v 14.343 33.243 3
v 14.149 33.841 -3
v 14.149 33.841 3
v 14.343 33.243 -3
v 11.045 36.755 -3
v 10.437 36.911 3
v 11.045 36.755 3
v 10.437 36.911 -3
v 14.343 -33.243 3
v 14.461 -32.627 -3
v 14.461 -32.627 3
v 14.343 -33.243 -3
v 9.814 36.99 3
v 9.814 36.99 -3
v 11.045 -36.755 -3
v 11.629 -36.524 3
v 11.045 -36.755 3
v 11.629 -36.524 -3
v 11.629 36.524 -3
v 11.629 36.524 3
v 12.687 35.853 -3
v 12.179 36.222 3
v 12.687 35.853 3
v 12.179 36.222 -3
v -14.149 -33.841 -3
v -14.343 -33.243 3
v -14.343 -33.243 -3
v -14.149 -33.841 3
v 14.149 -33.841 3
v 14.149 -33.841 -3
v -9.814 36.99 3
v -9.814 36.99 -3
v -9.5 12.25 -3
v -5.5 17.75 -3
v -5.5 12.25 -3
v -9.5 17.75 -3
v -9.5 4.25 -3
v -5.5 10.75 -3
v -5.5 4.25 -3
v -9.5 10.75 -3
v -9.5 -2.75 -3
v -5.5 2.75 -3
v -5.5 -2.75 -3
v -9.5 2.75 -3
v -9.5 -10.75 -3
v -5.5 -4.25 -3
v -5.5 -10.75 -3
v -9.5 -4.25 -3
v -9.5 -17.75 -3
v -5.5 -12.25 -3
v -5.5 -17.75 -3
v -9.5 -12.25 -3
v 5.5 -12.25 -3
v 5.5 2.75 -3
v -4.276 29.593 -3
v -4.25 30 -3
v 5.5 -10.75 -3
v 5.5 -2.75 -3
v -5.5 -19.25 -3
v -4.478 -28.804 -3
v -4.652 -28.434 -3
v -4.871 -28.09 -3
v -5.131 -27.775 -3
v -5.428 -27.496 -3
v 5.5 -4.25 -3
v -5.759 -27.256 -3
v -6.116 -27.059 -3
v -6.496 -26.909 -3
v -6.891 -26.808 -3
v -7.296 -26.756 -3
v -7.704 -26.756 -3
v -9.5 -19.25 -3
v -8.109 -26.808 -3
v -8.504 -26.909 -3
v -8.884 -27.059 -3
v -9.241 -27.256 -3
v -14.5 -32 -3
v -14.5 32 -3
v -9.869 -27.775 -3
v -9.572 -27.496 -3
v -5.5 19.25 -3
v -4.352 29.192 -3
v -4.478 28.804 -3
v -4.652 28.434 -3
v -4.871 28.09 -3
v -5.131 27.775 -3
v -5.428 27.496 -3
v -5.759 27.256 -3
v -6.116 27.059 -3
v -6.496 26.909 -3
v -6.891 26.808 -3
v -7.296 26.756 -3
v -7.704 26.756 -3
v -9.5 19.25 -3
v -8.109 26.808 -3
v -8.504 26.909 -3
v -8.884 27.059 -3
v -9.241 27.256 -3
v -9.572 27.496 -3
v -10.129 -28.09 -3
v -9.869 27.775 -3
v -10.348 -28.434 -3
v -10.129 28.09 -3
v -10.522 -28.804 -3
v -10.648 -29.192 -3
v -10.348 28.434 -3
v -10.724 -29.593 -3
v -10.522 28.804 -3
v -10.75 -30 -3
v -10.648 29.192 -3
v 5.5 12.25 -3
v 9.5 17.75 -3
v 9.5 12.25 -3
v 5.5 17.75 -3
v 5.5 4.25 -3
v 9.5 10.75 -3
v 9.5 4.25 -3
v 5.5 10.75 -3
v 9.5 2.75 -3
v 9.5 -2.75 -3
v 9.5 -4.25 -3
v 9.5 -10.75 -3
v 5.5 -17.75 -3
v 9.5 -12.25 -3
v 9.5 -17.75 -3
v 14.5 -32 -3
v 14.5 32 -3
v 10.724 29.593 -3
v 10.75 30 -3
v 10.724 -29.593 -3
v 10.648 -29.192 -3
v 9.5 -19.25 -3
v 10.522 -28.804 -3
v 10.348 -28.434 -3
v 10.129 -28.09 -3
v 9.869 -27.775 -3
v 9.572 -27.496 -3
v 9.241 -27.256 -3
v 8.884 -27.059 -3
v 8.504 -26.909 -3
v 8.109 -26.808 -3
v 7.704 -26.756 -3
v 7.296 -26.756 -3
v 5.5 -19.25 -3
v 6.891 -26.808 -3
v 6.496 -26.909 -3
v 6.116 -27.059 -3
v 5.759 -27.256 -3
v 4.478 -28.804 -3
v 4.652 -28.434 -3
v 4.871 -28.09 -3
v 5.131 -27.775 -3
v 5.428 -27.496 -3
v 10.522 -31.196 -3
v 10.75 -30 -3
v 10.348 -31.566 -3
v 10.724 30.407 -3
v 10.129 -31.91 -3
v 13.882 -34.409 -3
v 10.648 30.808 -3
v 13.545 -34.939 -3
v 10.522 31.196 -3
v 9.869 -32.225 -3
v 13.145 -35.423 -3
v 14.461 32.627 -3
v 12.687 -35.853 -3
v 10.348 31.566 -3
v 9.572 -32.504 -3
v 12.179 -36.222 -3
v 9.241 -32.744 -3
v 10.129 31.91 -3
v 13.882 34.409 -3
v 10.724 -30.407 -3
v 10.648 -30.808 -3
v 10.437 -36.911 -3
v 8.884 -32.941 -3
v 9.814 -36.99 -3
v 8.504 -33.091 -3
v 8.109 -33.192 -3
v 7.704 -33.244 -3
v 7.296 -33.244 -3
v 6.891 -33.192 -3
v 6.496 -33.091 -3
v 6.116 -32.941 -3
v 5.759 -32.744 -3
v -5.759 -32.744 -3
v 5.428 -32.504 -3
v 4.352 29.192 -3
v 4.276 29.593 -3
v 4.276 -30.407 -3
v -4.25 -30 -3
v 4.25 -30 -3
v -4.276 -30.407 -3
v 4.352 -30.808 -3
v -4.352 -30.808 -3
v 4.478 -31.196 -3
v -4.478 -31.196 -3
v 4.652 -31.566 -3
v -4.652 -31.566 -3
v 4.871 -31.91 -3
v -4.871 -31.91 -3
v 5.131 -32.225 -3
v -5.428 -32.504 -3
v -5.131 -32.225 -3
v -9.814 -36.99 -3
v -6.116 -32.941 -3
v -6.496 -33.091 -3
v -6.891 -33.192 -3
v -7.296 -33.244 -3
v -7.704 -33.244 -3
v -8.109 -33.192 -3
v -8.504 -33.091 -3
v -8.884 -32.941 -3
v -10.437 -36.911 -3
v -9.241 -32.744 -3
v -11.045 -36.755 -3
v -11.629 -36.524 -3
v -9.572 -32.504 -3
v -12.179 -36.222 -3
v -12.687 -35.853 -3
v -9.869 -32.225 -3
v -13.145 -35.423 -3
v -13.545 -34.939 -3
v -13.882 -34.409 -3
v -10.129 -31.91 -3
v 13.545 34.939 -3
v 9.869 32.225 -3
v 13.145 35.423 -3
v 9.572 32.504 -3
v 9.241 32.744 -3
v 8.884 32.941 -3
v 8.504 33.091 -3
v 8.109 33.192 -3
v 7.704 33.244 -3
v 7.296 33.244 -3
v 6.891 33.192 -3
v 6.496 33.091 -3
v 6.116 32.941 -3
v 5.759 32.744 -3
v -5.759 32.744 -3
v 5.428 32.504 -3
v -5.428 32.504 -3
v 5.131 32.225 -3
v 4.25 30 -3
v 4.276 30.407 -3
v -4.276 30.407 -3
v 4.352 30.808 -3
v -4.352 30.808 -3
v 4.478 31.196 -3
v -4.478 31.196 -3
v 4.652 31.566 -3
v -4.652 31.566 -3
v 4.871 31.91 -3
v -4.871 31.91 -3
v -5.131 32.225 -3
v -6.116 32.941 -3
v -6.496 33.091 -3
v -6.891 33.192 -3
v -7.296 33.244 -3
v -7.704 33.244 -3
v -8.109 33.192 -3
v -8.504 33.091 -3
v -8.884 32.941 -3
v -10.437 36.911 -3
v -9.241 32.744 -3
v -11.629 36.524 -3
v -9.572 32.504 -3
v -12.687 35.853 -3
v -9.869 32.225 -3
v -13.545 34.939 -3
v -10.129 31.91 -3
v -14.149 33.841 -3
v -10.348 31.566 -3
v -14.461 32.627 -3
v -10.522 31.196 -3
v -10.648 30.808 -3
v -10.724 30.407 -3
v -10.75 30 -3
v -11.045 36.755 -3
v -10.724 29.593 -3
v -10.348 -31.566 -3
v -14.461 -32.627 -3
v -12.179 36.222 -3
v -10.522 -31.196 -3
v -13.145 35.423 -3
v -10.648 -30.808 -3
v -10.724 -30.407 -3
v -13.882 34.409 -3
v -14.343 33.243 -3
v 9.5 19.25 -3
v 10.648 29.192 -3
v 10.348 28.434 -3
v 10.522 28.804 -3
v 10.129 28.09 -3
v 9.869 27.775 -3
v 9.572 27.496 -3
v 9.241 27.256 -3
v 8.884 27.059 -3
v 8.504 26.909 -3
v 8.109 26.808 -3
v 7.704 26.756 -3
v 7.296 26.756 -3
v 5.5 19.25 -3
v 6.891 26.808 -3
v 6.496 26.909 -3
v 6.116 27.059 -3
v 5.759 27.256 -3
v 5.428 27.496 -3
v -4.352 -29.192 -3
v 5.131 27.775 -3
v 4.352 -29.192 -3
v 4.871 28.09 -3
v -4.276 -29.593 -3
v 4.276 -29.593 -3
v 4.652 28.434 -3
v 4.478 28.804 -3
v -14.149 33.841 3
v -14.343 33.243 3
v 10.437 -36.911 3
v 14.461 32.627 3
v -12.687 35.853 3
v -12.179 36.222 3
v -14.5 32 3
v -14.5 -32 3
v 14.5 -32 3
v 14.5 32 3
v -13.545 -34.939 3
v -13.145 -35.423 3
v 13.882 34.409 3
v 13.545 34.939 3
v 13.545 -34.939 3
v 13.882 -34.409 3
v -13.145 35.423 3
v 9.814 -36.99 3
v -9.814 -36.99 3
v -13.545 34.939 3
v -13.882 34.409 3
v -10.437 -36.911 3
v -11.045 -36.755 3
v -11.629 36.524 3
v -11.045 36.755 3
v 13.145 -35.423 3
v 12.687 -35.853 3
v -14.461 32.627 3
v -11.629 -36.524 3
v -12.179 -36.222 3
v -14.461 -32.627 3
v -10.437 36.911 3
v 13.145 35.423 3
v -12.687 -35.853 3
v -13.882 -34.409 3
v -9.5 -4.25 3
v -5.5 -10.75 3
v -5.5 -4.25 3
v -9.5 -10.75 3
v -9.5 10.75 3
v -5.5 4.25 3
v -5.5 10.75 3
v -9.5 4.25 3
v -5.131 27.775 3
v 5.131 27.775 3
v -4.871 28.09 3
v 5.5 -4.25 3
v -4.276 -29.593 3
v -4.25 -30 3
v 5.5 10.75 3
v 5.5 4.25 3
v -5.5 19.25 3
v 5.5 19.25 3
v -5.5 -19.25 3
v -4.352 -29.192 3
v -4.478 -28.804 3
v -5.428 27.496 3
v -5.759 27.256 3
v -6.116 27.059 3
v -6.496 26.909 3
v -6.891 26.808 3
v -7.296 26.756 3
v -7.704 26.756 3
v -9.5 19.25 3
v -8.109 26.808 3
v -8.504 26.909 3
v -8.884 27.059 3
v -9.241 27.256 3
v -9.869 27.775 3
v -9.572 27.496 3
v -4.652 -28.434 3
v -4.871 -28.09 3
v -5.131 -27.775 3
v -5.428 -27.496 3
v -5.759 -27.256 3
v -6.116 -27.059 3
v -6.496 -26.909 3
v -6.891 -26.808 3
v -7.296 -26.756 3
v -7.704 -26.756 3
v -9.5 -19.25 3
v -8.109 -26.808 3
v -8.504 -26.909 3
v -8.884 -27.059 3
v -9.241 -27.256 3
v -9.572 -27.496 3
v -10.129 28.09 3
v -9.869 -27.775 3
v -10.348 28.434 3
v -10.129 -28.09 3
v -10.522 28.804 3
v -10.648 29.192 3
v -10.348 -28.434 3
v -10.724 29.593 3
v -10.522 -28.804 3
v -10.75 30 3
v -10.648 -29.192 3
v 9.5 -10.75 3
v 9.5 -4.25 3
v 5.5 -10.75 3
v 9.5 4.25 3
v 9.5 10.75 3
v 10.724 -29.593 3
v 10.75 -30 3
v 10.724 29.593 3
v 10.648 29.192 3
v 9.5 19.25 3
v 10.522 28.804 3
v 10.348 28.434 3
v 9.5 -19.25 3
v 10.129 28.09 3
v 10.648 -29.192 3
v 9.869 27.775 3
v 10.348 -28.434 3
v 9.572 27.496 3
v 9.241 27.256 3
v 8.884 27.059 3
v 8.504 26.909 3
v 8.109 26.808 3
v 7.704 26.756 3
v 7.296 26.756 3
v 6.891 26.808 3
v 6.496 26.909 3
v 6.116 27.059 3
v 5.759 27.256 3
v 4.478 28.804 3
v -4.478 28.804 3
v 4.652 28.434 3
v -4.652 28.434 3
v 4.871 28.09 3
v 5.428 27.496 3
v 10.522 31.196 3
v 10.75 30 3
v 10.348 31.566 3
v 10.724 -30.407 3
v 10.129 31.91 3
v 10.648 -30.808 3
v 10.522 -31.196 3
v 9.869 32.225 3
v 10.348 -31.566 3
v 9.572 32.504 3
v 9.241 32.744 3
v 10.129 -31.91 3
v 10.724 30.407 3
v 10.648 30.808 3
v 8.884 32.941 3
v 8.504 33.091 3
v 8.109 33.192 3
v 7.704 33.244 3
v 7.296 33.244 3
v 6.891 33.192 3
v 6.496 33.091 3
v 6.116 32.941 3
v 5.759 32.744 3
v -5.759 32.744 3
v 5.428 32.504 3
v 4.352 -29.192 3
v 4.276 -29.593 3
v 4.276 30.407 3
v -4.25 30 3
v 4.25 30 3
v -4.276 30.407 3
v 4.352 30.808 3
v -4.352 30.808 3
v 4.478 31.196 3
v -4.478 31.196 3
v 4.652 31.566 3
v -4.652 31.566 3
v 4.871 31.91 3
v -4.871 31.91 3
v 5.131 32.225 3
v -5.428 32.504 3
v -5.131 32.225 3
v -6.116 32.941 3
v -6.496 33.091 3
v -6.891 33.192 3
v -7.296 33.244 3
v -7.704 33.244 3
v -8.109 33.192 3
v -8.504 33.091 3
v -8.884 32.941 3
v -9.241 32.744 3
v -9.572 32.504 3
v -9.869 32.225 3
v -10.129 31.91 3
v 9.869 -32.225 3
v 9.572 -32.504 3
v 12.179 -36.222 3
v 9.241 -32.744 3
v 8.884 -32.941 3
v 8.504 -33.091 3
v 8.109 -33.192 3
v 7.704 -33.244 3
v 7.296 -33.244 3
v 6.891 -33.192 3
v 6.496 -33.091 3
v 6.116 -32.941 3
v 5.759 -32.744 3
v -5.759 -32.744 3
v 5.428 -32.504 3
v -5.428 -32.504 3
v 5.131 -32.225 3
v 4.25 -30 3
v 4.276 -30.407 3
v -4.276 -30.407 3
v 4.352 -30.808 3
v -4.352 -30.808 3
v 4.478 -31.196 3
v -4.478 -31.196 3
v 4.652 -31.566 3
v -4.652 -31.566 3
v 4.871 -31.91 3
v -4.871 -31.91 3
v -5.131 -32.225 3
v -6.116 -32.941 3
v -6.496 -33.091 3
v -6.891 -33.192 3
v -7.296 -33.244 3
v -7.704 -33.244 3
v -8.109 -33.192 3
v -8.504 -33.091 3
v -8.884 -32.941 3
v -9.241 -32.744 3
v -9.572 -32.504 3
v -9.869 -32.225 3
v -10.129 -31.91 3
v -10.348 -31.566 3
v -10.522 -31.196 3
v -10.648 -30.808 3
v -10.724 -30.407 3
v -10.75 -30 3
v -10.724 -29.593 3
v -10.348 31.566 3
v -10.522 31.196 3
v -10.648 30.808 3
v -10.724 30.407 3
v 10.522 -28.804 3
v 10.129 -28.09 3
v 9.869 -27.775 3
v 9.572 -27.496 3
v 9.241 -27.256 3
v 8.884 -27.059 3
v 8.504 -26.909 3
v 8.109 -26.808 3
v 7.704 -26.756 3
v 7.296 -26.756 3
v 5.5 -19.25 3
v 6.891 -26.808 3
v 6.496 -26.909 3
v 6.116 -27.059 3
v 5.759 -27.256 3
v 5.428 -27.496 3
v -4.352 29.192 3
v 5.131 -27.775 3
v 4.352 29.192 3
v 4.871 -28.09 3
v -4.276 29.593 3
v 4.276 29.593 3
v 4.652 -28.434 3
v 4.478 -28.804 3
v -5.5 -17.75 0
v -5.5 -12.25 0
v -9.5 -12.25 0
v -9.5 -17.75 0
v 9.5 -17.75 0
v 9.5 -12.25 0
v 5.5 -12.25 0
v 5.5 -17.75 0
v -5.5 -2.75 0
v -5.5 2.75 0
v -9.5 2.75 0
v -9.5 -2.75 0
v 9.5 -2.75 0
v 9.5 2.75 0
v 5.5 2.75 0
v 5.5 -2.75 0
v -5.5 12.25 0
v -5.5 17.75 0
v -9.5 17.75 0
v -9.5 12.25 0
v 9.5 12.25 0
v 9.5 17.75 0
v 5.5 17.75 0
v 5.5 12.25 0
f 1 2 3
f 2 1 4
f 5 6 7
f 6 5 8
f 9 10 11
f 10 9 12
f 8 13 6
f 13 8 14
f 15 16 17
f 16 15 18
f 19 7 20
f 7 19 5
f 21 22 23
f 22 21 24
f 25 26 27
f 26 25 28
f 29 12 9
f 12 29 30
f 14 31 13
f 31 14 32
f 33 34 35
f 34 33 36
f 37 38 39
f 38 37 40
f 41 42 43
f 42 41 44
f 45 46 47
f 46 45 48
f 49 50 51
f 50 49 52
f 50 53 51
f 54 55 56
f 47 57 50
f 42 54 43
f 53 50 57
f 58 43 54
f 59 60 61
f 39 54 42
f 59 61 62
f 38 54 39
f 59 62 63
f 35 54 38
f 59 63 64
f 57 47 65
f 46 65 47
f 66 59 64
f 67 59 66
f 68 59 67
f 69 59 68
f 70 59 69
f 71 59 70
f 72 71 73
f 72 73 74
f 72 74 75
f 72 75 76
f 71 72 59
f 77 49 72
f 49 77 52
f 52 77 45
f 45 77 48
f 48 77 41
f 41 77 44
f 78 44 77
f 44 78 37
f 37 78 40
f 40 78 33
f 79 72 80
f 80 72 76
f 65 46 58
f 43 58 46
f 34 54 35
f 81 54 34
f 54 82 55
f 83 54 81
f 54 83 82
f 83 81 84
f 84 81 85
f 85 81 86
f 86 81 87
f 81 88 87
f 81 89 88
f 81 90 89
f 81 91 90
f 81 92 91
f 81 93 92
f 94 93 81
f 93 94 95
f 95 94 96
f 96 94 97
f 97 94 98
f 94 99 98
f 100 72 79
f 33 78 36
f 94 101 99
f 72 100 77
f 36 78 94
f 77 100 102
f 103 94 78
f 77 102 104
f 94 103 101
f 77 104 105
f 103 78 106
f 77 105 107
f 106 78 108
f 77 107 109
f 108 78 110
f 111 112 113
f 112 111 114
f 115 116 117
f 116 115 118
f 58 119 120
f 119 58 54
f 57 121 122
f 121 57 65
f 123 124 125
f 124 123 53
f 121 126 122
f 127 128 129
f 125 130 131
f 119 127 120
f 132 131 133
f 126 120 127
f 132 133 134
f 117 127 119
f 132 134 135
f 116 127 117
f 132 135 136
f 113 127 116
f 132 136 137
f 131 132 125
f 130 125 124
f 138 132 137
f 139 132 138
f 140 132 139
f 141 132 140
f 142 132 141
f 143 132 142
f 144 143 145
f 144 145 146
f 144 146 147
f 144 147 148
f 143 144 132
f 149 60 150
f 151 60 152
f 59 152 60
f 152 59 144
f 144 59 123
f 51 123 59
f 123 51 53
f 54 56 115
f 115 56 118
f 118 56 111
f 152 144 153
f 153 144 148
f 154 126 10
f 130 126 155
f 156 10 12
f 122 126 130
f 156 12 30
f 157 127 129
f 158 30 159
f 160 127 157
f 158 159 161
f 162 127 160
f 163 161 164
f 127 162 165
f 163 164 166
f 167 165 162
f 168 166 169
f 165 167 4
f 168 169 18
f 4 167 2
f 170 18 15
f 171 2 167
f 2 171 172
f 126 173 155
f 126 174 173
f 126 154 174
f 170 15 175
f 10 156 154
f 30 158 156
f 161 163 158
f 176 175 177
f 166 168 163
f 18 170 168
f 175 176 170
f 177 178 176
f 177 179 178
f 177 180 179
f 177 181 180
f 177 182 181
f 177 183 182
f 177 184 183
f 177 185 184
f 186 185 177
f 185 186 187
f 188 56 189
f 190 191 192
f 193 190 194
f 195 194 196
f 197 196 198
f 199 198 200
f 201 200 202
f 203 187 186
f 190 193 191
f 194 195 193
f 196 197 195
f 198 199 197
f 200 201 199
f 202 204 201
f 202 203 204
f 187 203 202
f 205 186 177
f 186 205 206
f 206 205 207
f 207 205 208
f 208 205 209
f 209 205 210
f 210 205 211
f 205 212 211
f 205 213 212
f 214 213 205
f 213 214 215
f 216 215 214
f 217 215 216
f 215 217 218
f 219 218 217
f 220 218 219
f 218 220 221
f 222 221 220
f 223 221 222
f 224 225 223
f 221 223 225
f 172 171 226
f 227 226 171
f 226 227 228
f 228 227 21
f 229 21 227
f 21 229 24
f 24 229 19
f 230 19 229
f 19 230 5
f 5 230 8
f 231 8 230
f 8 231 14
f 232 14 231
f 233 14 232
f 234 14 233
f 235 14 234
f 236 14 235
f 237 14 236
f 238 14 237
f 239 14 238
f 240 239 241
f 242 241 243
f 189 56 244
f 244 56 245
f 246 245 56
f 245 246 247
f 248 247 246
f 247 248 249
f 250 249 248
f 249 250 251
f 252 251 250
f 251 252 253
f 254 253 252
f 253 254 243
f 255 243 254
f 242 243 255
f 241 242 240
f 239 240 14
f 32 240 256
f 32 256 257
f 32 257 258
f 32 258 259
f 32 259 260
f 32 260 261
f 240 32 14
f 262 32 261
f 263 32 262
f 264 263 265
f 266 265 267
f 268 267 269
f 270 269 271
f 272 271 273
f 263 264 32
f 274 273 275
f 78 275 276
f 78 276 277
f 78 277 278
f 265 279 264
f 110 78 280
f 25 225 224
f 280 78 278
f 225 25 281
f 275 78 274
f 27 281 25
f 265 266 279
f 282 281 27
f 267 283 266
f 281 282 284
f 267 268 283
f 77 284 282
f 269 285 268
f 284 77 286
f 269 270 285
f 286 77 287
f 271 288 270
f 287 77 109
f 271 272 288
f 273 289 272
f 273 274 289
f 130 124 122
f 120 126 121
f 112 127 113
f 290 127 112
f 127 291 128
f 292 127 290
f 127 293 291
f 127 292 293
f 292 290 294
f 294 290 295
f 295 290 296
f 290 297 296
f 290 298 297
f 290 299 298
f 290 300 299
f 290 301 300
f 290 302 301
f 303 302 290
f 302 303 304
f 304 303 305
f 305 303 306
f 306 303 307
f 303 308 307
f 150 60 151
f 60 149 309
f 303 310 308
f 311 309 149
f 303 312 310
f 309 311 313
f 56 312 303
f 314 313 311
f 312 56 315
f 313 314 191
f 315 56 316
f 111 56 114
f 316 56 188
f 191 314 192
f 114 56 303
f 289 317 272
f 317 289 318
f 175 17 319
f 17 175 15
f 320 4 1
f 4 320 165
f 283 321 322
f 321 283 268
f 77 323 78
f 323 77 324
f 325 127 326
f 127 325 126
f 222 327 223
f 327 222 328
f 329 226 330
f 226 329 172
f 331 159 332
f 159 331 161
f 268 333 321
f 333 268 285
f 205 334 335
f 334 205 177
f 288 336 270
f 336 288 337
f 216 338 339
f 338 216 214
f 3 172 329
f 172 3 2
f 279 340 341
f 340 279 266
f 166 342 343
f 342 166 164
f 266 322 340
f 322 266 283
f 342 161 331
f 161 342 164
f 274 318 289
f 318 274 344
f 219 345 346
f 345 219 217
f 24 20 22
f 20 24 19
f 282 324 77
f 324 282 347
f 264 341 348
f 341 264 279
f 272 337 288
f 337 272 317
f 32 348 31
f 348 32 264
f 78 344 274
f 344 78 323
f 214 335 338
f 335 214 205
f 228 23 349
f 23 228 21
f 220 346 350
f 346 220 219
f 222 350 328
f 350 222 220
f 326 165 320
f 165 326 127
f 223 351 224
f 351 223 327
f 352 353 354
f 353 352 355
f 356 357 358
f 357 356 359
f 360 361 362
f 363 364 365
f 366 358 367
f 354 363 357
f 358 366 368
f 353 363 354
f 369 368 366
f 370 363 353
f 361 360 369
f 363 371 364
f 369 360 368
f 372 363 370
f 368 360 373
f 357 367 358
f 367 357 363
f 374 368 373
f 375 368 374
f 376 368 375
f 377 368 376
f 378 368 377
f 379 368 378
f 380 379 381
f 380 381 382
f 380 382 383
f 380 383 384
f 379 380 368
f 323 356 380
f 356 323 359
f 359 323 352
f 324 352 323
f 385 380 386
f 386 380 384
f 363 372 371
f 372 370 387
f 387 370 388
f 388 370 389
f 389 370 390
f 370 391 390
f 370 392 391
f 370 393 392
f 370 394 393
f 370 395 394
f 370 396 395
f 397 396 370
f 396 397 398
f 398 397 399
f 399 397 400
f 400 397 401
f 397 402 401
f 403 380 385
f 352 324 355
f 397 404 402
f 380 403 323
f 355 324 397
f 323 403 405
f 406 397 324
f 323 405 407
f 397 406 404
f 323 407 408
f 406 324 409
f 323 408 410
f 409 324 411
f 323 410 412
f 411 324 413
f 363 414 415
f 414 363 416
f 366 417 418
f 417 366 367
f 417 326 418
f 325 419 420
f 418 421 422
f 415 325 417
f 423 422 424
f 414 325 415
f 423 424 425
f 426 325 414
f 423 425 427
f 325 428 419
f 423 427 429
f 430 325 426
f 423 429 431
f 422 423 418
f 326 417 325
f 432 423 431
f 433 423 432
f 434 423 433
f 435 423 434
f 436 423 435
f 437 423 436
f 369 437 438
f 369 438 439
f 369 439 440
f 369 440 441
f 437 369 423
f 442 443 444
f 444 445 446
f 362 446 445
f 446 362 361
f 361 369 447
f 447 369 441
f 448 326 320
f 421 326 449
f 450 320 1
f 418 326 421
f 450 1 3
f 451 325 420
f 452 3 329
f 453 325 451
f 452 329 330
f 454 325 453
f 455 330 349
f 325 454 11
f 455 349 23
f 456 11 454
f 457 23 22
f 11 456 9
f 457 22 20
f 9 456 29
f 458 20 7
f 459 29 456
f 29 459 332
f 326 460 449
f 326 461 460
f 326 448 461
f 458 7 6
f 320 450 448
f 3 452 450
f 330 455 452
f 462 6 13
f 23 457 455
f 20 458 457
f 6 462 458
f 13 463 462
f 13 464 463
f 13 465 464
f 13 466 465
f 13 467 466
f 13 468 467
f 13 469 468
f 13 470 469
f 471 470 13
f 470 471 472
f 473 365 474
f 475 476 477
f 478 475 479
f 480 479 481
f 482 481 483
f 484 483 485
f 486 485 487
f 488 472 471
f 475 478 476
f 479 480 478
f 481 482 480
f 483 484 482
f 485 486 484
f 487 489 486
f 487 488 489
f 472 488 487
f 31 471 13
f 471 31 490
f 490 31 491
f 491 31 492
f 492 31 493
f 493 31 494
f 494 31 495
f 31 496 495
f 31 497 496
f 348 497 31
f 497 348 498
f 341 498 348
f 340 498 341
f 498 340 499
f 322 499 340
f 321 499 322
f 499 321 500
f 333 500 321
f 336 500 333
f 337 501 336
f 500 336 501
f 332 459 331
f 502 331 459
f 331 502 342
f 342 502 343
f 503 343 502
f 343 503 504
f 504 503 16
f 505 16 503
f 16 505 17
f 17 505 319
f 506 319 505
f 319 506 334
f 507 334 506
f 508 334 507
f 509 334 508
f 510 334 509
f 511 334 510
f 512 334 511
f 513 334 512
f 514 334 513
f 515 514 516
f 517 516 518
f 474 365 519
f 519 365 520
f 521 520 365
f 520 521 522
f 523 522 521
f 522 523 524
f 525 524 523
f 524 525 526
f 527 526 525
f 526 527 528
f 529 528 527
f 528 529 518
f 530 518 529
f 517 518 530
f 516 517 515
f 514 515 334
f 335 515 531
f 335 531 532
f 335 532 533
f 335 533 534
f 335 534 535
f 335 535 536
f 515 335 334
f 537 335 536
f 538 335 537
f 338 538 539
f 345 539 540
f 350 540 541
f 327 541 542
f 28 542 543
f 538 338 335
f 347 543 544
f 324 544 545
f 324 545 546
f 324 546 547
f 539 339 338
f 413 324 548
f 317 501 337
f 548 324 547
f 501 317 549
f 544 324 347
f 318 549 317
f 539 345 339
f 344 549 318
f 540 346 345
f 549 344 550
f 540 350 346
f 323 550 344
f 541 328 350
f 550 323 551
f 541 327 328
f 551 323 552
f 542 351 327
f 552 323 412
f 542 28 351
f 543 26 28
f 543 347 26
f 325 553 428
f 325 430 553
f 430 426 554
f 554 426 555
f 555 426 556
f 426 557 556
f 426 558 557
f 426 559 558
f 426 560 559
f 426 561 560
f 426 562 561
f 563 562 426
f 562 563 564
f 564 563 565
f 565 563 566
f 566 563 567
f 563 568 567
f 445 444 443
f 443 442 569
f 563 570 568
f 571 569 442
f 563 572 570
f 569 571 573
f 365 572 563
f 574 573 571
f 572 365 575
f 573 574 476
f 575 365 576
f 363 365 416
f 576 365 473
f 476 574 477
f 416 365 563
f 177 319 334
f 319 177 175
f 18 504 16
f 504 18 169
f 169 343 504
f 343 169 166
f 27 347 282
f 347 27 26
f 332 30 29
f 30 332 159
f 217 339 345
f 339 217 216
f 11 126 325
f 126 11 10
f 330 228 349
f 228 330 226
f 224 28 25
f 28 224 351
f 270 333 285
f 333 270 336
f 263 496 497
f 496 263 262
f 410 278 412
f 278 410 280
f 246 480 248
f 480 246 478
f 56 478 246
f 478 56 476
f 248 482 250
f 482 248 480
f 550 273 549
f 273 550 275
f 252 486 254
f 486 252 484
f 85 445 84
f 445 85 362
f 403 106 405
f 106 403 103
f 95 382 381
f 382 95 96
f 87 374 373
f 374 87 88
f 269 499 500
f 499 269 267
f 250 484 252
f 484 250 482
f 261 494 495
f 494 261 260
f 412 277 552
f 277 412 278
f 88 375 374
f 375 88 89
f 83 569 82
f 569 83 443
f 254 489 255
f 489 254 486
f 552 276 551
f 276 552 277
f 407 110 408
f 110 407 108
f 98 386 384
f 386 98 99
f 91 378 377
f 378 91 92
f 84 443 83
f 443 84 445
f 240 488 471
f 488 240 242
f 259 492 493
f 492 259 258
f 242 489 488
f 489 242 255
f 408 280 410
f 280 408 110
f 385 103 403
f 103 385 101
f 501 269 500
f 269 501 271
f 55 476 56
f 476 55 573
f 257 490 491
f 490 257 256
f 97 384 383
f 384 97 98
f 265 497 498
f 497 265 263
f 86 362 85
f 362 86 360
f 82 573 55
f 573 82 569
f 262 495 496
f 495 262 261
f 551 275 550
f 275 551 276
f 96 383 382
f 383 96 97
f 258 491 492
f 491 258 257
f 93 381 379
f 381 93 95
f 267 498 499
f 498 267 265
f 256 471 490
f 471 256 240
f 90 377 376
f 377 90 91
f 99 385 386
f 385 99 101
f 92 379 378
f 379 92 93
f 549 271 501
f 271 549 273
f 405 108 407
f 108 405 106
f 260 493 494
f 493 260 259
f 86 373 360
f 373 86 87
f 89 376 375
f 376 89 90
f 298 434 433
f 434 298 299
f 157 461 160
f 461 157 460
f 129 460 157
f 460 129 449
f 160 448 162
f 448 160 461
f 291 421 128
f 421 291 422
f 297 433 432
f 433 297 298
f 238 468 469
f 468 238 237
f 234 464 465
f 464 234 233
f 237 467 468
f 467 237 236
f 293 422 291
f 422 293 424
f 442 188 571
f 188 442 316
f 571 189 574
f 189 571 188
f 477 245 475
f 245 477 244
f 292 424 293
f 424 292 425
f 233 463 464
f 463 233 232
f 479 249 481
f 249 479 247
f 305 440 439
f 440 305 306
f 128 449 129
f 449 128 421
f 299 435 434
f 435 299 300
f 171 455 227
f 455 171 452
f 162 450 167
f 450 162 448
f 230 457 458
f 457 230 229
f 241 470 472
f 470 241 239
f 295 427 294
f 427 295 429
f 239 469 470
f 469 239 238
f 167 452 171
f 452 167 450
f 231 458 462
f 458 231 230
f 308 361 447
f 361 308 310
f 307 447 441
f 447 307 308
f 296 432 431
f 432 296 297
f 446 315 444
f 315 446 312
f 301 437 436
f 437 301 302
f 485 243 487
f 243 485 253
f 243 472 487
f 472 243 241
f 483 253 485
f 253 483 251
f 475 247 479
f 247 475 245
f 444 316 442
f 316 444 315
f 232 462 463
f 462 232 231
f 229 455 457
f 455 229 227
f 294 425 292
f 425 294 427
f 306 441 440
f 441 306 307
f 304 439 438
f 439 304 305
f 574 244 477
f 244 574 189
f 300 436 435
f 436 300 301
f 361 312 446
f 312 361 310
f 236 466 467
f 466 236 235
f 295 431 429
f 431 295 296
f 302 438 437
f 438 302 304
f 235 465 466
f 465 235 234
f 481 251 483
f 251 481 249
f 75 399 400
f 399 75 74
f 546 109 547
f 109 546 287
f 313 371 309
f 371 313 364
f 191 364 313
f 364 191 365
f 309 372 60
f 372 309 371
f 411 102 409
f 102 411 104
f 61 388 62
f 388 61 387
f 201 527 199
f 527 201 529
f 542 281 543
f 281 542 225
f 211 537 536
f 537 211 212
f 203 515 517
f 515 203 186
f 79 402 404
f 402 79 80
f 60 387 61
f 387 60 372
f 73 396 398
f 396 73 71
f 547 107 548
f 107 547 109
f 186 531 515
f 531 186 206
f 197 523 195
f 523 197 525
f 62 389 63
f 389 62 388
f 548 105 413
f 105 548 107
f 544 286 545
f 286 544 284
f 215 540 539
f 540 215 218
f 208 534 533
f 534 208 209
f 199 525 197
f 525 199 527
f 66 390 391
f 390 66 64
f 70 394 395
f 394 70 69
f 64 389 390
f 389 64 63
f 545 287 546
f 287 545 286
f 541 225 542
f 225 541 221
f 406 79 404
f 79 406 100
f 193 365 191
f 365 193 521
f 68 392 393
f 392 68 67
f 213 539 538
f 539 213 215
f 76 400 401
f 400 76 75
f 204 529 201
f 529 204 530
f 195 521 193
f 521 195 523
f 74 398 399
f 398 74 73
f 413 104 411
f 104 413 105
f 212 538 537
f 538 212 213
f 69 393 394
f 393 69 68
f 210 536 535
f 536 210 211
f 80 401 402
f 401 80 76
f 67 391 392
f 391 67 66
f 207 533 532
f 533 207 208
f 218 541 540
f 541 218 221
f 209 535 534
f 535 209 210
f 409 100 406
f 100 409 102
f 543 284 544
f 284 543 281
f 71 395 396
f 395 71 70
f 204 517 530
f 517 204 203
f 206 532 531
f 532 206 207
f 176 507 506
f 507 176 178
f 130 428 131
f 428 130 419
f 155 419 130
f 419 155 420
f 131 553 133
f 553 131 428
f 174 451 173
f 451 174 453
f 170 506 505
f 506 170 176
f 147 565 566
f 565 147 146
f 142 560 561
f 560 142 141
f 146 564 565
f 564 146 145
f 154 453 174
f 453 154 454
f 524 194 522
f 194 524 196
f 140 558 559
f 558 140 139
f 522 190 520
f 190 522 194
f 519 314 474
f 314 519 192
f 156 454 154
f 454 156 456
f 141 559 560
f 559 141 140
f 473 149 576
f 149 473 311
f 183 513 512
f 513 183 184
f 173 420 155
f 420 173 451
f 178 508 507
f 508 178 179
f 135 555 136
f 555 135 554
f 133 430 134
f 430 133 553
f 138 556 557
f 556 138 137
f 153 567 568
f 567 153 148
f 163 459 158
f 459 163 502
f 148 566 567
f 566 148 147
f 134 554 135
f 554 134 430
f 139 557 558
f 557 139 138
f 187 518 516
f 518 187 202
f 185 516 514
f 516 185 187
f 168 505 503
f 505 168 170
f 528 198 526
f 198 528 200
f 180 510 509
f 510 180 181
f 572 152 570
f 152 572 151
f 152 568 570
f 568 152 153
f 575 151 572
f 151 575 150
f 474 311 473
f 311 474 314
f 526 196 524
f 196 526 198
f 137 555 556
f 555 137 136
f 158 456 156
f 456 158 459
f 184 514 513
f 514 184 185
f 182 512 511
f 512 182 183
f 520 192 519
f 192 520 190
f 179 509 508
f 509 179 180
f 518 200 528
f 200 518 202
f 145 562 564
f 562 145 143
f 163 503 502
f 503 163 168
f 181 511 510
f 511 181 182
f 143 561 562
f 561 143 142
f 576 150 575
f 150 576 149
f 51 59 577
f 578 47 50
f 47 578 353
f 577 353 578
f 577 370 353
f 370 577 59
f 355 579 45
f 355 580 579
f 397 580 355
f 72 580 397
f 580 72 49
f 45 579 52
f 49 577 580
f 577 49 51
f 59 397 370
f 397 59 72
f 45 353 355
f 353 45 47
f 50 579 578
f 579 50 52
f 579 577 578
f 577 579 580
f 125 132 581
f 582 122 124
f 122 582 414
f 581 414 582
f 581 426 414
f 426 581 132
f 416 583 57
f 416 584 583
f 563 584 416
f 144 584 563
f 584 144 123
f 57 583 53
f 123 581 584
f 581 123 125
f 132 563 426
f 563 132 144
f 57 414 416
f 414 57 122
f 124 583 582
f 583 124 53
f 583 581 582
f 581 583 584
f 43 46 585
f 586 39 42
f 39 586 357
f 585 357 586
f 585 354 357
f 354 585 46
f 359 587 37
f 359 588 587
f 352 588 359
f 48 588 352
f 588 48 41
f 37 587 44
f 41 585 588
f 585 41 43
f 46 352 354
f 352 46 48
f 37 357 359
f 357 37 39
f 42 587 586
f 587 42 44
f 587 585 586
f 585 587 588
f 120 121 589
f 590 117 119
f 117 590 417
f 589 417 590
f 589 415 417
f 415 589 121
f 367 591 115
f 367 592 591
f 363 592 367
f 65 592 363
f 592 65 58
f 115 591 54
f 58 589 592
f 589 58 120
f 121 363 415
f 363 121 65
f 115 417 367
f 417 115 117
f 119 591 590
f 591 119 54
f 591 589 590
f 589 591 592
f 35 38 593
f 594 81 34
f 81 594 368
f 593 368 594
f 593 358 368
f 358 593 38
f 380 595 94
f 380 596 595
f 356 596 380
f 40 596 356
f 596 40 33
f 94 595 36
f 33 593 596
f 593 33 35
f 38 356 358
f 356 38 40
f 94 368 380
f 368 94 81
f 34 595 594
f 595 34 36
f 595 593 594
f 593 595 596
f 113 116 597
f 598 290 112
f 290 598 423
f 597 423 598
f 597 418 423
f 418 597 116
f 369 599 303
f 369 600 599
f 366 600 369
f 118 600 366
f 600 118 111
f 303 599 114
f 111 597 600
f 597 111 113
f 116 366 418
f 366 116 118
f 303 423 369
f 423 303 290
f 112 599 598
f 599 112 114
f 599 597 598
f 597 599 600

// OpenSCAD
$fn = 50;


difference() {
	union() {
		translate(v = [0, 0, -3.0000000000]) {
			hull() {
				translate(v = [-9.5000000000, 32.0000000000, 0]) {
					cylinder(h = 6, r = 5);
				}
				translate(v = [9.5000000000, 32.0000000000, 0]) {
					cylinder(h = 6, r = 5);
				}
				translate(v = [-9.5000000000, -32.0000000000, 0]) {
					cylinder(h = 6, r = 5);
				}
				translate(v = [9.5000000000, -32.0000000000, 0]) {
					cylinder(h = 6, r = 5);
				}
			}
		}
		translate(v = [0, 0, -3.0000000000]) {
			hull() {
				translate(v = [-9.5000000000, 32.0000000000, 0]) {
					cylinder(h = 6, r = 5);
				}
				translate(v = [9.5000000000, 32.0000000000, 0]) {
					cylinder(h = 6, r = 5);
				}
				translate(v = [-9.5000000000, -32.0000000000, 0]) {
					cylinder(h = 6, r = 5);
				}
				translate(v = [9.5000000000, -32.0000000000, 0]) {
					cylinder(h = 6, r = 5);
				}
			}
		}
	}
	union() {
		translate(v = [-7.5000000000, 30.0000000000, -100.0000000000]) {
			cylinder(h = 200, r = 3.2500000000);
		}
		translate(v = [7.5000000000, 30.0000000000, -100.0000000000]) {
			cylinder(h = 200, r = 3.2500000000);
		}
		translate(v = [-7.5000000000, -30.0000000000, -100.0000000000]) {
			cylinder(h = 200, r = 3.2500000000);
		}
		translate(v = [7.5000000000, -30.0000000000, -100.0000000000]) {
			cylinder(h = 200, r = 3.2500000000);
		}
		translate(v = [-9.5000000000, -19.2500000000, -50]) {
			cube(size = [4, 1.5000000000, 100]);
		}
		translate(v = [-9.5000000000, -12.2500000000, -50]) {
			cube(size = [4, 1.5000000000, 100]);
		}
		translate(v = [-9.5000000000, -19.2500000000, 0]) {
			cube(size = [4, 8.5000000000, 3]);
		}
		translate(v = [5.5000000000, -19.2500000000, -50]) {
			cube(size = [4, 1.5000000000, 100]);
		}
		translate(v = [5.5000000000, -12.2500000000, -50]) {
			cube(size = [4, 1.5000000000, 100]);
		}
		translate(v = [5.5000000000, -19.2500000000, 0]) {
			cube(size = [4, 8.5000000000, 3]);
		}
		translate(v = [-9.5000000000, -4.2500000000, -50]) {
			cube(size = [4, 1.5000000000, 100]);
		}
		translate(v = [-9.5000000000, 2.7500000000, -50]) {
			cube(size = [4, 1.5000000000, 100]);
		}
		translate(v = [-9.5000000000, -4.2500000000, 0]) {
			cube(size = [4, 8.5000000000, 3]);
		}
		translate(v = [5.5000000000, -4.2500000000, -50]) {
			cube(size = [4, 1.5000000000, 100]);
		}
		translate(v = [5.5000000000, 2.7500000000, -50]) {
			cube(size = [4, 1.5000000000, 100]);
		}
		translate(v = [5.5000000000, -4.2500000000, 0]) {
			cube(size = [4, 8.5000000000, 3]);
		}
		translate(v = [-9.5000000000, 10.7500000000, -50]) {
			cube(size = [4, 1.5000000000, 100]);
		}
		translate(v = [-9.5000000000, 17.7500000000, -50]) {
			cube(size = [4, 1.5000000000, 100]);
		}
		translate(v = [-9.5000000000, 10.7500000000, 0]) {
			cube(size = [4, 8.5000000000, 3]);
		}
		translate(v = [5.5000000000, 10.7500000000, -50]) {
			cube(size = [4, 1.5000000000, 100]);
		}
		translate(v = [5.5000000000, 17.7500000000, -50]) {
			cube(size = [4, 1.5000000000, 100]);
		}
		translate(v = [5.5000000000, 10.7500000000, 0]) {
			cube(size = [4, 8.5000000000, 3]);
		}
	}
}
